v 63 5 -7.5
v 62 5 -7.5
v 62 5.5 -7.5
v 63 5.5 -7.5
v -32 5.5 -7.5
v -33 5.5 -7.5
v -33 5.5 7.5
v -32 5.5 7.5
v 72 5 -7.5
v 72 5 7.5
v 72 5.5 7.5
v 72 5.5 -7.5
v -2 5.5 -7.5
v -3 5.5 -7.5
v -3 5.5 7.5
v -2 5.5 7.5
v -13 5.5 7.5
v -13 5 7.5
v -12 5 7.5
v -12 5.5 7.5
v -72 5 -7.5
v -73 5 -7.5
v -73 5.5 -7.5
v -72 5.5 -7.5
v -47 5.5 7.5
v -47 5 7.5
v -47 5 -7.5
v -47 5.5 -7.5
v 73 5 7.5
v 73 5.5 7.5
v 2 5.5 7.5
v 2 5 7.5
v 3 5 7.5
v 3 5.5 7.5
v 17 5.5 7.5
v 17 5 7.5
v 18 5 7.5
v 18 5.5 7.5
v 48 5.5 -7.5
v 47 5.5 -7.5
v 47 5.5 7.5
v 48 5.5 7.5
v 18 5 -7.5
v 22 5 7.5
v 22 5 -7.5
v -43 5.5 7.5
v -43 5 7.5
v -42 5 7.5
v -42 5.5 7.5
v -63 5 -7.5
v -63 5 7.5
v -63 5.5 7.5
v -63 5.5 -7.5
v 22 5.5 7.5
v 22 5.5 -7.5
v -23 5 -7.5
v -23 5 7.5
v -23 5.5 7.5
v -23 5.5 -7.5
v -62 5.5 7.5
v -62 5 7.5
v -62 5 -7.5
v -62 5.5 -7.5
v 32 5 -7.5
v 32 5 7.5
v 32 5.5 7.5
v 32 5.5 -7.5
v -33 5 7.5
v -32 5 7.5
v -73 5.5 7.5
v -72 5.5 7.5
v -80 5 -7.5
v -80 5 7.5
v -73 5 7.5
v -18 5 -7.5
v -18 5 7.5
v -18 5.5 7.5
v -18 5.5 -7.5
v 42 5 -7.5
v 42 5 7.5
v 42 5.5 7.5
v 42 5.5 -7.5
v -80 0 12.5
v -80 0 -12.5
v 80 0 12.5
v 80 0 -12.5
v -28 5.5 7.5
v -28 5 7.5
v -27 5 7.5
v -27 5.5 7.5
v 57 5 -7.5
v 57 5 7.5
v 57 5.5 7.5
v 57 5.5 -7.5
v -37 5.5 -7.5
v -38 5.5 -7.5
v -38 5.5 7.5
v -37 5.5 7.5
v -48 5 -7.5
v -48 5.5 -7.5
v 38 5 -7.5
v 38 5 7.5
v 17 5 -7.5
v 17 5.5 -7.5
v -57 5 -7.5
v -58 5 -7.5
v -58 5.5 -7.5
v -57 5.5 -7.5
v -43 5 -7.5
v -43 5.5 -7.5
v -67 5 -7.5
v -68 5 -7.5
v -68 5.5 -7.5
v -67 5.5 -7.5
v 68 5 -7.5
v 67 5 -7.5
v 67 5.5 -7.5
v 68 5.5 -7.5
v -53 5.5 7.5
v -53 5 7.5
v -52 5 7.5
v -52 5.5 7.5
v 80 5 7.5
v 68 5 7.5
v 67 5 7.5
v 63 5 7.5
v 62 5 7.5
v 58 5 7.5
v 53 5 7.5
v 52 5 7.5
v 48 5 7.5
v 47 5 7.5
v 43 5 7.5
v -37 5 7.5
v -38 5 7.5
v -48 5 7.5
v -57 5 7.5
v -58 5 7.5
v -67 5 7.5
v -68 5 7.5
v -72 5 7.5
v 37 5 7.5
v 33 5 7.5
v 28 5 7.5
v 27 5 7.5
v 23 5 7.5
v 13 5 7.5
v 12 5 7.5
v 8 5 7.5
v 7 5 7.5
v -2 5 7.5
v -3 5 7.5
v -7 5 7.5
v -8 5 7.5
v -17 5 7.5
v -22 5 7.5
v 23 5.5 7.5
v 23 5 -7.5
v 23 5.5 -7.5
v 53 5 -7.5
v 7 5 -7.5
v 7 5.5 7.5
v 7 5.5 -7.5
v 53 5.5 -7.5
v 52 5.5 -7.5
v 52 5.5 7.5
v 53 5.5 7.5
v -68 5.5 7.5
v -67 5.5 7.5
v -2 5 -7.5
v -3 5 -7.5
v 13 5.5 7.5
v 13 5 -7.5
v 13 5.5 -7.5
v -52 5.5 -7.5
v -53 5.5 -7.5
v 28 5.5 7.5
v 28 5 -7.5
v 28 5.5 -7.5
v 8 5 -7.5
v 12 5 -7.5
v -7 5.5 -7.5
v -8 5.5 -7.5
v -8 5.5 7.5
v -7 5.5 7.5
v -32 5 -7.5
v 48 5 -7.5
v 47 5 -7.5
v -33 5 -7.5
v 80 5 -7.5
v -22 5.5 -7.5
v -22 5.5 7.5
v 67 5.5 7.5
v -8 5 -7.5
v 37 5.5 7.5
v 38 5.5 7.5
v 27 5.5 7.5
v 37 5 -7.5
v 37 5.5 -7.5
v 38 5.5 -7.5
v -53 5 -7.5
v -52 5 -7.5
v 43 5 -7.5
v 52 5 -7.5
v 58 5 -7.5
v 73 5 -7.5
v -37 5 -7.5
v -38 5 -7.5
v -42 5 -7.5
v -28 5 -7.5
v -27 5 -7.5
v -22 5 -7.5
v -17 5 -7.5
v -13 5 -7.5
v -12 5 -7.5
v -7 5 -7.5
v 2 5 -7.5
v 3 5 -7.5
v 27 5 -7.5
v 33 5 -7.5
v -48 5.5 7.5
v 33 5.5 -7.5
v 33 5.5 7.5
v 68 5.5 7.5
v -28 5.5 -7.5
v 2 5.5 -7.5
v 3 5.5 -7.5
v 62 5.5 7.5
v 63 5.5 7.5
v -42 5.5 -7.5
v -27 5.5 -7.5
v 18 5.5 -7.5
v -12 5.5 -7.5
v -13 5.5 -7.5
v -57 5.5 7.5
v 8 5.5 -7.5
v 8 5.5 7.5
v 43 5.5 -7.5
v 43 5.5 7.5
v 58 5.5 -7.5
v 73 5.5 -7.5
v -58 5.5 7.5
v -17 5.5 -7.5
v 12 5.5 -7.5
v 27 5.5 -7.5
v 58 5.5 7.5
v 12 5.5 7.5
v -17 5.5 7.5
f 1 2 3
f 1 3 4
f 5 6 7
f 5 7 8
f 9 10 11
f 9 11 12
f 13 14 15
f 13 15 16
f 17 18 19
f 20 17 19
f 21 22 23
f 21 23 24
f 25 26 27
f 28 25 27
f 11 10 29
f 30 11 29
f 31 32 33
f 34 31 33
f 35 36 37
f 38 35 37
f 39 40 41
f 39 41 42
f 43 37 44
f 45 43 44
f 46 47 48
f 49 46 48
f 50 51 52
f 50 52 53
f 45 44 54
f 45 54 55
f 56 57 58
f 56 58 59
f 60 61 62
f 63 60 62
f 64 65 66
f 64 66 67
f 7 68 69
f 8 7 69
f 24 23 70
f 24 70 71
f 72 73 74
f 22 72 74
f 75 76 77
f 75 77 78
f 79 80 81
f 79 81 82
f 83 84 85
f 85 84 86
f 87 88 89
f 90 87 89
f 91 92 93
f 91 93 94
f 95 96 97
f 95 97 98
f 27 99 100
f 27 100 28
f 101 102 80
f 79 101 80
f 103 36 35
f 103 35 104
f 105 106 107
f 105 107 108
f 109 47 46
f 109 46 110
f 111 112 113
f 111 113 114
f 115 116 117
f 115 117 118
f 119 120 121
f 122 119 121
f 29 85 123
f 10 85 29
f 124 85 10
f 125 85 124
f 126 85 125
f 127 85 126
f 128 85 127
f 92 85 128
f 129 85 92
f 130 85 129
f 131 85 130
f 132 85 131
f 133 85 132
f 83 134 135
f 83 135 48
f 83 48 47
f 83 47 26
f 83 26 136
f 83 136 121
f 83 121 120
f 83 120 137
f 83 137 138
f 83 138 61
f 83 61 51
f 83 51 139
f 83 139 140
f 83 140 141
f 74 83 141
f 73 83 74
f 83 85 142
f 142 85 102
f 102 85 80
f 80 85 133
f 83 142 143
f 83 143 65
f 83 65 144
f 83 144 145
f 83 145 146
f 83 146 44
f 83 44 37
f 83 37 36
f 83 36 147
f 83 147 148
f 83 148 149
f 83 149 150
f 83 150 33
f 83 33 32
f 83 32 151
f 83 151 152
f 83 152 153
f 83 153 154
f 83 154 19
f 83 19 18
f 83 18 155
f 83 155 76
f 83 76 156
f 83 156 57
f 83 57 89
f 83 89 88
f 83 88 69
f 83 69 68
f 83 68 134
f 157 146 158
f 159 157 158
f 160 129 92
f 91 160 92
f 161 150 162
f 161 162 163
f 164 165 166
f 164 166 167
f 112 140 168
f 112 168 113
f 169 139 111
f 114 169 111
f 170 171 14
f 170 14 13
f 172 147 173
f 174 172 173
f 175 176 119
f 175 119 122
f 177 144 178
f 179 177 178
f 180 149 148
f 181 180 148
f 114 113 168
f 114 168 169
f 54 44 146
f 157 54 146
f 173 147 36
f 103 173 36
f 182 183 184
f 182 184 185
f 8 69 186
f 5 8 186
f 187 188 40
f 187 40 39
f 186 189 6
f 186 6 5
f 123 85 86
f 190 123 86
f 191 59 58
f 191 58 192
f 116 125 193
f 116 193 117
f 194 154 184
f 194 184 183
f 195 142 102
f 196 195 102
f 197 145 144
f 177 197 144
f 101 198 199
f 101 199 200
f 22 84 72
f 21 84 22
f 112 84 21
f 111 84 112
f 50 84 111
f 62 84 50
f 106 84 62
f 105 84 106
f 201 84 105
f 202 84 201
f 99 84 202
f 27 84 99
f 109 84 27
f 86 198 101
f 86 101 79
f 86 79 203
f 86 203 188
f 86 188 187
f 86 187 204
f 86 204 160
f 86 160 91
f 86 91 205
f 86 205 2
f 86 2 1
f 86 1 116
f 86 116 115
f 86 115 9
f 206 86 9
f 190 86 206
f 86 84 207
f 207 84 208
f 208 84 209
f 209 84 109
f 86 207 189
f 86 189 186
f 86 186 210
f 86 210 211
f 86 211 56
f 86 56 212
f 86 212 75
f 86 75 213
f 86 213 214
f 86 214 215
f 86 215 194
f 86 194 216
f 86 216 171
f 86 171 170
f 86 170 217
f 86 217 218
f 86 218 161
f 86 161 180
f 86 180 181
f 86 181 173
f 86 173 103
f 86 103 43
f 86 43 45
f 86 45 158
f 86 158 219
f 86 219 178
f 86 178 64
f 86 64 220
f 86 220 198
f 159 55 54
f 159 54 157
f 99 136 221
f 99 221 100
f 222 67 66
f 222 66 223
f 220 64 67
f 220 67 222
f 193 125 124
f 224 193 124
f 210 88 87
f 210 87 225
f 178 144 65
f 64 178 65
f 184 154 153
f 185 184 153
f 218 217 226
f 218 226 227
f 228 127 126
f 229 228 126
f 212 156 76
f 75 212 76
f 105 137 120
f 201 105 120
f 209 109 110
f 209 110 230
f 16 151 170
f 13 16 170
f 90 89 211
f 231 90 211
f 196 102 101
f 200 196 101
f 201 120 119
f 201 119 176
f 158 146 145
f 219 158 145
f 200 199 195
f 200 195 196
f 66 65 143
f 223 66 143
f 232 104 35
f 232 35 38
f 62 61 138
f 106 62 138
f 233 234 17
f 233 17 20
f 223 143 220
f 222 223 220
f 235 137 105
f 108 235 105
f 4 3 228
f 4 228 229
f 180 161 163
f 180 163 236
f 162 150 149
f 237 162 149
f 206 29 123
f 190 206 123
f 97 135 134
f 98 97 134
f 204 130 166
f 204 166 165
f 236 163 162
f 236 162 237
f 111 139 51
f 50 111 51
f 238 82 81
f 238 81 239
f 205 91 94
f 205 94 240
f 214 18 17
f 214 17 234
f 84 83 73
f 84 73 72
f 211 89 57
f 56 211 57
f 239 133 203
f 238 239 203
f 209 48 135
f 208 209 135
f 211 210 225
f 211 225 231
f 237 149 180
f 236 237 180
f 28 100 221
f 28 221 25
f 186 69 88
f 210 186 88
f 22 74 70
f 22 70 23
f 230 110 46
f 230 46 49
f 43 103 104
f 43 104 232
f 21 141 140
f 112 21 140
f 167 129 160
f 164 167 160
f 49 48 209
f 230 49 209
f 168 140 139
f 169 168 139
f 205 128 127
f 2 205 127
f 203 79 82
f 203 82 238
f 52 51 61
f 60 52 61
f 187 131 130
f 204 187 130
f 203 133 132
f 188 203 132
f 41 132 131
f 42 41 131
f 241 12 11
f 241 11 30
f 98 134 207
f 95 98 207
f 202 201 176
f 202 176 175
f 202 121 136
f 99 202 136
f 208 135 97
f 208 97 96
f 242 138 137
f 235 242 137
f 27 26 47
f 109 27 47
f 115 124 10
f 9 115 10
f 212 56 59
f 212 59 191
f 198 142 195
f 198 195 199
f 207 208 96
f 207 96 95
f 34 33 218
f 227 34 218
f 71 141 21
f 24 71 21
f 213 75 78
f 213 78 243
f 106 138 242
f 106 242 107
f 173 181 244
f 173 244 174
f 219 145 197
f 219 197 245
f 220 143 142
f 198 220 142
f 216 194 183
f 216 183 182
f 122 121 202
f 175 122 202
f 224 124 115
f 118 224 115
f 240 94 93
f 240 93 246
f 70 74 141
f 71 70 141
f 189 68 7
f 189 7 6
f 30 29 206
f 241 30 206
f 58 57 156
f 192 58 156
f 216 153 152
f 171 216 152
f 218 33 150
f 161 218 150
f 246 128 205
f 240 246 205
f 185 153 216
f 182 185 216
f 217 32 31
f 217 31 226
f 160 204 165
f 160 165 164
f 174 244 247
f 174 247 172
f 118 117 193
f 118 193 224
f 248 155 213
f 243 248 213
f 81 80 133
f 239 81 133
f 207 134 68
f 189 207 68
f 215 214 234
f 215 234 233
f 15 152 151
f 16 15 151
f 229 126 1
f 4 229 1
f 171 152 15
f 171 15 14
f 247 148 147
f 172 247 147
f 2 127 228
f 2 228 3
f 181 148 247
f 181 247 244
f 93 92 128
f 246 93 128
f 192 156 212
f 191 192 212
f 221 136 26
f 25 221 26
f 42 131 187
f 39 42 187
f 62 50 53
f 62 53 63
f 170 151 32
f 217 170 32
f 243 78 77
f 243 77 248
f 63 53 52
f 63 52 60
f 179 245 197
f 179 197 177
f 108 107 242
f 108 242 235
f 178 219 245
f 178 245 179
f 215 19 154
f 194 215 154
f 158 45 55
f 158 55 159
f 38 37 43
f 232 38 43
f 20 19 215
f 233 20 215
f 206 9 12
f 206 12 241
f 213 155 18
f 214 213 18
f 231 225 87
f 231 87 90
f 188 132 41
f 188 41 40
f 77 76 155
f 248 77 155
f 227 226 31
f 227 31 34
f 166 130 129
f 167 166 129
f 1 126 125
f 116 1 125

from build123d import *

# Parameters (mm, degrees)
SKETCH1_W           = 160
SKETCH1_H           = 35
BOSS_EXTRUDE1_DEPTH = 5
CHAMFER1_SIZE       = 10
SKETCH2_W           = 1
SKETCH2_H           = 15
BOSS_EXTRUDE2_DEPTH = 0.5


with BuildPart() as part:
    # Sketch1 → Boss-Extrude1 (new body)
    with BuildSketch(Plane(origin=(0, 0, 0), x_dir=(1, 0, 0), z_dir=(0, 1, 0))):
        Rectangle(SKETCH1_W, SKETCH1_H)
    extrude(amount=BOSS_EXTRUDE1_DEPTH)

    # Chamfer1
    # the kernel refuses this chamfer: 10 mm, written as the material it takes off along each edge
    with BuildSketch(Plane(origin=(105.71682988, 5, -17.5), x_dir=(0, -0.9996219169112968, -0.027495876610586317), z_dir=(-1, 0, 0)), Plane(origin=(-105.71682988, 5, 17.5), x_dir=(0, -0.9996219169112968, 0.027495876610586317), z_dir=(1, 0, 0))) as chamfer1_piece_1:
        Polygon((CHAMFER1_SIZE * 0.999621916911, CHAMFER1_SIZE * 0.0274958766106), (-CHAMFER1_SIZE * 0.0274958766106, CHAMFER1_SIZE * 0.999621916911), (0, 0), align=None)
    extrude(amount=211.433659759, mode=Mode.SUBTRACT)

    # Sketch2 → Boss-Extrude2 (add)
    with BuildSketch(Plane(origin=(0, 5, 0), x_dir=(1, 0, 0), z_dir=(0, 1, 0))):
        with Locations((72.5, 0)):
            Rectangle(SKETCH2_W, SKETCH2_H)
        with Locations((67.5, 0)):
            Rectangle(SKETCH2_W, SKETCH2_H)
        with Locations((62.5, 0)):
            Rectangle(SKETCH2_W, SKETCH2_H)
        with Locations((57.5, 0)):
            Rectangle(SKETCH2_W, SKETCH2_H)
        with Locations((52.5, 0)):
            Rectangle(SKETCH2_W, SKETCH2_H)
        with Locations((47.5, 0)):
            Rectangle(SKETCH2_W, SKETCH2_H)
        with Locations((42.5, 0)):
            Rectangle(SKETCH2_W, SKETCH2_H)
        with Locations((37.5, 0)):
            Rectangle(SKETCH2_W, SKETCH2_H)
        with Locations((32.5, 0)):
            Rectangle(SKETCH2_W, SKETCH2_H)
        with Locations((27.5, 0)):
            Rectangle(SKETCH2_W, SKETCH2_H)
        with Locations((22.5, 0)):
            Rectangle(SKETCH2_W, SKETCH2_H)
        with Locations((17.5, 0)):
            Rectangle(SKETCH2_W, SKETCH2_H)
        with Locations((12.5, 0)):
            Rectangle(SKETCH2_W, SKETCH2_H)
        with Locations((7.5, 0)):
            Rectangle(SKETCH2_W, SKETCH2_H)
        with Locations((2.5, 0)):
            Rectangle(SKETCH2_W, SKETCH2_H)
        with Locations((-2.5, 0)):
            Rectangle(SKETCH2_W, SKETCH2_H)
        with Locations((-7.5, 0)):
            Rectangle(SKETCH2_W, SKETCH2_H)
        with Locations((-12.5, 0)):
            Rectangle(SKETCH2_W, SKETCH2_H)
        with Locations((-17.5, 0)):
            Rectangle(SKETCH2_W, SKETCH2_H)
        with Locations((-22.5, 0)):
            Rectangle(SKETCH2_W, SKETCH2_H)
        with Locations((-27.5, 0)):
            Rectangle(SKETCH2_W, SKETCH2_H)
        with Locations((-32.5, 0)):
            Rectangle(SKETCH2_W, SKETCH2_H)
        with Locations((-37.5, 0)):
            Rectangle(SKETCH2_W, SKETCH2_H)
        with Locations((-42.5, 0)):
            Rectangle(SKETCH2_W, SKETCH2_H)
        with Locations((-47.5, 0)):
            Rectangle(SKETCH2_W, SKETCH2_H)
        with Locations((-52.5, 0)):
            Rectangle(SKETCH2_W, SKETCH2_H)
        with Locations((-57.5, 0)):
            Rectangle(SKETCH2_W, SKETCH2_H)
        with Locations((-62.5, 0)):
            Rectangle(SKETCH2_W, SKETCH2_H)
        with Locations((-67.5, 0)):
            Rectangle(SKETCH2_W, SKETCH2_H)
        with Locations((-72.5, 0)):
            Rectangle(SKETCH2_W, SKETCH2_H)
    extrude(amount=BOSS_EXTRUDE2_DEPTH)


solid = part.part
